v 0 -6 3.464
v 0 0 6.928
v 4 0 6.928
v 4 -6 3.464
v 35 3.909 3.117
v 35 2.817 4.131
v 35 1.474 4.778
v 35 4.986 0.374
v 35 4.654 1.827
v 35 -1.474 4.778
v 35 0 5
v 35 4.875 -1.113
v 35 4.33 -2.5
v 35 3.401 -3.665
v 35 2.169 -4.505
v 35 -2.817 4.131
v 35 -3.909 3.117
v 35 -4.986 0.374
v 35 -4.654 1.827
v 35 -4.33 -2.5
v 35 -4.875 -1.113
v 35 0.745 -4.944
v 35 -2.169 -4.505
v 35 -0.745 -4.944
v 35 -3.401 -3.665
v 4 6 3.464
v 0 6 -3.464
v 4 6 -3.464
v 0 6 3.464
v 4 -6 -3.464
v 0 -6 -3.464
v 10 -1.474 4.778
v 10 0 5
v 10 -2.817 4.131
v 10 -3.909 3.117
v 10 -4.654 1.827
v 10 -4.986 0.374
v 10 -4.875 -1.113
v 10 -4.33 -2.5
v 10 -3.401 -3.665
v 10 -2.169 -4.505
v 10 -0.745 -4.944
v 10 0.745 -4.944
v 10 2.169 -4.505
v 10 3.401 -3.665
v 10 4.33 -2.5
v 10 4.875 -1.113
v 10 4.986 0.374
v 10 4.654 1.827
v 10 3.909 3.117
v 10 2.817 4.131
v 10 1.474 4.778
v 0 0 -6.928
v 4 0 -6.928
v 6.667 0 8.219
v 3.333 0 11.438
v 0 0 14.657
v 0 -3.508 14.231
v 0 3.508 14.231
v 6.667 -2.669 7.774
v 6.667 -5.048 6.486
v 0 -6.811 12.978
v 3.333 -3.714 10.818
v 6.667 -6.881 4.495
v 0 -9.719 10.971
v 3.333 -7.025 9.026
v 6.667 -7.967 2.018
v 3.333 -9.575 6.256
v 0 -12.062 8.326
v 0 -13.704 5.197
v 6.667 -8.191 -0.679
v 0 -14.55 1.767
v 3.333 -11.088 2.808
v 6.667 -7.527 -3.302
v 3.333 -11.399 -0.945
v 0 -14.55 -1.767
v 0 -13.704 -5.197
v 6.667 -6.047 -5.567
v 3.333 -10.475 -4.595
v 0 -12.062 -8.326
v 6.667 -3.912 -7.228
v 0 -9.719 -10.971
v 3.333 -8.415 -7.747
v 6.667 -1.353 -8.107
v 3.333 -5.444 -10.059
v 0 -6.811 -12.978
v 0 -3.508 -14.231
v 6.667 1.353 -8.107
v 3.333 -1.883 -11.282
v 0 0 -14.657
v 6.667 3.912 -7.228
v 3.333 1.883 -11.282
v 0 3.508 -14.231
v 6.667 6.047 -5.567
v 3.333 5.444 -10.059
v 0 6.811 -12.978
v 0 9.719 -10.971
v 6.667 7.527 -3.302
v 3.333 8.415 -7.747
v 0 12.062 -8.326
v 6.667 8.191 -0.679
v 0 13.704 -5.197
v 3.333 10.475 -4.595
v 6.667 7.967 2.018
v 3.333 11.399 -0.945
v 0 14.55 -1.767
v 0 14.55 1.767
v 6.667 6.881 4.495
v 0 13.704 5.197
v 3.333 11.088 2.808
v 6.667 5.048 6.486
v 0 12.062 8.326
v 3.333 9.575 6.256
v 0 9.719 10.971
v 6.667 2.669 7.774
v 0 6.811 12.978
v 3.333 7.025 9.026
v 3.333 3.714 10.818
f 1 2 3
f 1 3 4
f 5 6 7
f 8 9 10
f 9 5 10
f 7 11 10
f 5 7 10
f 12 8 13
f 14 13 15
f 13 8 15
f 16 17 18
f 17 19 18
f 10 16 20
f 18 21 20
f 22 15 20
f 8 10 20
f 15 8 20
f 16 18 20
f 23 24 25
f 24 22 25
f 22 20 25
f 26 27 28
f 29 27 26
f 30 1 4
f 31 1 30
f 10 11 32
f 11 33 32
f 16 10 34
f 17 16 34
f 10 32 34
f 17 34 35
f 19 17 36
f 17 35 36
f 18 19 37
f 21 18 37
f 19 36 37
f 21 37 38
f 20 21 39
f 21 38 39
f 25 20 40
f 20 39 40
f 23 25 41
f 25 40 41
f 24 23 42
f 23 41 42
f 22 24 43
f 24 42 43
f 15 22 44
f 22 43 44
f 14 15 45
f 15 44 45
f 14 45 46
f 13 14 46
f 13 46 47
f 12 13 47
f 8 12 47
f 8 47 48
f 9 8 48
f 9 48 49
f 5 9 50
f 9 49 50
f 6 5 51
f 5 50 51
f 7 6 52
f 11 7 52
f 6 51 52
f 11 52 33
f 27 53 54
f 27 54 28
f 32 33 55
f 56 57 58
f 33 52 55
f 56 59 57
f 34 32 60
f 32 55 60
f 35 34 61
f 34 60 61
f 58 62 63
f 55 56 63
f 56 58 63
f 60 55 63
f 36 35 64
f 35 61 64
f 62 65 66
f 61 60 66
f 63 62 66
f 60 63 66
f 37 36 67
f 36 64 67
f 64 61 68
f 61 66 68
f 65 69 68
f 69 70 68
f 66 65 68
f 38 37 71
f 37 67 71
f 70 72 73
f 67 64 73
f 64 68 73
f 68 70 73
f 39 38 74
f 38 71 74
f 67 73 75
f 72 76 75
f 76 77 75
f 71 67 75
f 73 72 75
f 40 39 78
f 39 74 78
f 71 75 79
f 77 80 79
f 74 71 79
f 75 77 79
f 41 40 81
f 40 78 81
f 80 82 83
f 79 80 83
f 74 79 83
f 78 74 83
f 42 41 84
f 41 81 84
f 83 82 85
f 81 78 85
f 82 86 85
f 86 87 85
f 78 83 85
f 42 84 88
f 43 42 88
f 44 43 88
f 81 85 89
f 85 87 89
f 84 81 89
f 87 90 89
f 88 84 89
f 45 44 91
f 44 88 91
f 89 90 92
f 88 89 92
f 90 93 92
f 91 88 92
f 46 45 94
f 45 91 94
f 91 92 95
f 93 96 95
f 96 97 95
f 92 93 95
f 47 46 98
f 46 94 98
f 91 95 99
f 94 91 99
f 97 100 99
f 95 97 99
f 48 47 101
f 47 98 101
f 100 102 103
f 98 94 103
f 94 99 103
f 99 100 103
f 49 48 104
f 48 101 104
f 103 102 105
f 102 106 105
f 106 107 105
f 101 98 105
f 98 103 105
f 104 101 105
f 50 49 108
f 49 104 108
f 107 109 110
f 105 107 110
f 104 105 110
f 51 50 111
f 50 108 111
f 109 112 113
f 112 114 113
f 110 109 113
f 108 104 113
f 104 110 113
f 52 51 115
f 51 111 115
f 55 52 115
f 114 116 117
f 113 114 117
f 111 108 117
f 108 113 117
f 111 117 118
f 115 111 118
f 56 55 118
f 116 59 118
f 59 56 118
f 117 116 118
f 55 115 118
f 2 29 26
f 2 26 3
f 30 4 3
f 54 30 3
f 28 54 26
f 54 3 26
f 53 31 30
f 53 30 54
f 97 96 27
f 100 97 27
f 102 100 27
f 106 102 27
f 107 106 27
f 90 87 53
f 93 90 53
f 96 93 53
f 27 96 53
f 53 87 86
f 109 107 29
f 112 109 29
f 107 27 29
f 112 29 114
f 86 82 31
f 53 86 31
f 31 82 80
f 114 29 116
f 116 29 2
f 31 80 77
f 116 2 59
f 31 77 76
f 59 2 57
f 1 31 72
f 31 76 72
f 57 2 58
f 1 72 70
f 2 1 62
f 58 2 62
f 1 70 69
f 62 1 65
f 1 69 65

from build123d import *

# Parameters (mm, degrees)
F3_DEPTH = 4


with BuildPart() as f1:
    # F0 (on Front) → F1 (revolve)
    with BuildSketch(Plane.XZ):
        Polygon((0, 14.656888), (0, 0), (35, 0), (35, 5), (10, 5), align=None)
    revolve(axis=Axis((17.5, 0, 0), (1, 0, 0)))

    # F2 (on Right) → F3 (cut)
    with BuildSketch(Plane.YZ):
        Polygon((0, 6.928203), (-6, 3.464102), (-6, -3.464102), (0, -6.928203), (6, -3.464102), (6, 3.464102), align=None)
    extrude(amount=F3_DEPTH, mode=Mode.SUBTRACT)


solid = f1.part
